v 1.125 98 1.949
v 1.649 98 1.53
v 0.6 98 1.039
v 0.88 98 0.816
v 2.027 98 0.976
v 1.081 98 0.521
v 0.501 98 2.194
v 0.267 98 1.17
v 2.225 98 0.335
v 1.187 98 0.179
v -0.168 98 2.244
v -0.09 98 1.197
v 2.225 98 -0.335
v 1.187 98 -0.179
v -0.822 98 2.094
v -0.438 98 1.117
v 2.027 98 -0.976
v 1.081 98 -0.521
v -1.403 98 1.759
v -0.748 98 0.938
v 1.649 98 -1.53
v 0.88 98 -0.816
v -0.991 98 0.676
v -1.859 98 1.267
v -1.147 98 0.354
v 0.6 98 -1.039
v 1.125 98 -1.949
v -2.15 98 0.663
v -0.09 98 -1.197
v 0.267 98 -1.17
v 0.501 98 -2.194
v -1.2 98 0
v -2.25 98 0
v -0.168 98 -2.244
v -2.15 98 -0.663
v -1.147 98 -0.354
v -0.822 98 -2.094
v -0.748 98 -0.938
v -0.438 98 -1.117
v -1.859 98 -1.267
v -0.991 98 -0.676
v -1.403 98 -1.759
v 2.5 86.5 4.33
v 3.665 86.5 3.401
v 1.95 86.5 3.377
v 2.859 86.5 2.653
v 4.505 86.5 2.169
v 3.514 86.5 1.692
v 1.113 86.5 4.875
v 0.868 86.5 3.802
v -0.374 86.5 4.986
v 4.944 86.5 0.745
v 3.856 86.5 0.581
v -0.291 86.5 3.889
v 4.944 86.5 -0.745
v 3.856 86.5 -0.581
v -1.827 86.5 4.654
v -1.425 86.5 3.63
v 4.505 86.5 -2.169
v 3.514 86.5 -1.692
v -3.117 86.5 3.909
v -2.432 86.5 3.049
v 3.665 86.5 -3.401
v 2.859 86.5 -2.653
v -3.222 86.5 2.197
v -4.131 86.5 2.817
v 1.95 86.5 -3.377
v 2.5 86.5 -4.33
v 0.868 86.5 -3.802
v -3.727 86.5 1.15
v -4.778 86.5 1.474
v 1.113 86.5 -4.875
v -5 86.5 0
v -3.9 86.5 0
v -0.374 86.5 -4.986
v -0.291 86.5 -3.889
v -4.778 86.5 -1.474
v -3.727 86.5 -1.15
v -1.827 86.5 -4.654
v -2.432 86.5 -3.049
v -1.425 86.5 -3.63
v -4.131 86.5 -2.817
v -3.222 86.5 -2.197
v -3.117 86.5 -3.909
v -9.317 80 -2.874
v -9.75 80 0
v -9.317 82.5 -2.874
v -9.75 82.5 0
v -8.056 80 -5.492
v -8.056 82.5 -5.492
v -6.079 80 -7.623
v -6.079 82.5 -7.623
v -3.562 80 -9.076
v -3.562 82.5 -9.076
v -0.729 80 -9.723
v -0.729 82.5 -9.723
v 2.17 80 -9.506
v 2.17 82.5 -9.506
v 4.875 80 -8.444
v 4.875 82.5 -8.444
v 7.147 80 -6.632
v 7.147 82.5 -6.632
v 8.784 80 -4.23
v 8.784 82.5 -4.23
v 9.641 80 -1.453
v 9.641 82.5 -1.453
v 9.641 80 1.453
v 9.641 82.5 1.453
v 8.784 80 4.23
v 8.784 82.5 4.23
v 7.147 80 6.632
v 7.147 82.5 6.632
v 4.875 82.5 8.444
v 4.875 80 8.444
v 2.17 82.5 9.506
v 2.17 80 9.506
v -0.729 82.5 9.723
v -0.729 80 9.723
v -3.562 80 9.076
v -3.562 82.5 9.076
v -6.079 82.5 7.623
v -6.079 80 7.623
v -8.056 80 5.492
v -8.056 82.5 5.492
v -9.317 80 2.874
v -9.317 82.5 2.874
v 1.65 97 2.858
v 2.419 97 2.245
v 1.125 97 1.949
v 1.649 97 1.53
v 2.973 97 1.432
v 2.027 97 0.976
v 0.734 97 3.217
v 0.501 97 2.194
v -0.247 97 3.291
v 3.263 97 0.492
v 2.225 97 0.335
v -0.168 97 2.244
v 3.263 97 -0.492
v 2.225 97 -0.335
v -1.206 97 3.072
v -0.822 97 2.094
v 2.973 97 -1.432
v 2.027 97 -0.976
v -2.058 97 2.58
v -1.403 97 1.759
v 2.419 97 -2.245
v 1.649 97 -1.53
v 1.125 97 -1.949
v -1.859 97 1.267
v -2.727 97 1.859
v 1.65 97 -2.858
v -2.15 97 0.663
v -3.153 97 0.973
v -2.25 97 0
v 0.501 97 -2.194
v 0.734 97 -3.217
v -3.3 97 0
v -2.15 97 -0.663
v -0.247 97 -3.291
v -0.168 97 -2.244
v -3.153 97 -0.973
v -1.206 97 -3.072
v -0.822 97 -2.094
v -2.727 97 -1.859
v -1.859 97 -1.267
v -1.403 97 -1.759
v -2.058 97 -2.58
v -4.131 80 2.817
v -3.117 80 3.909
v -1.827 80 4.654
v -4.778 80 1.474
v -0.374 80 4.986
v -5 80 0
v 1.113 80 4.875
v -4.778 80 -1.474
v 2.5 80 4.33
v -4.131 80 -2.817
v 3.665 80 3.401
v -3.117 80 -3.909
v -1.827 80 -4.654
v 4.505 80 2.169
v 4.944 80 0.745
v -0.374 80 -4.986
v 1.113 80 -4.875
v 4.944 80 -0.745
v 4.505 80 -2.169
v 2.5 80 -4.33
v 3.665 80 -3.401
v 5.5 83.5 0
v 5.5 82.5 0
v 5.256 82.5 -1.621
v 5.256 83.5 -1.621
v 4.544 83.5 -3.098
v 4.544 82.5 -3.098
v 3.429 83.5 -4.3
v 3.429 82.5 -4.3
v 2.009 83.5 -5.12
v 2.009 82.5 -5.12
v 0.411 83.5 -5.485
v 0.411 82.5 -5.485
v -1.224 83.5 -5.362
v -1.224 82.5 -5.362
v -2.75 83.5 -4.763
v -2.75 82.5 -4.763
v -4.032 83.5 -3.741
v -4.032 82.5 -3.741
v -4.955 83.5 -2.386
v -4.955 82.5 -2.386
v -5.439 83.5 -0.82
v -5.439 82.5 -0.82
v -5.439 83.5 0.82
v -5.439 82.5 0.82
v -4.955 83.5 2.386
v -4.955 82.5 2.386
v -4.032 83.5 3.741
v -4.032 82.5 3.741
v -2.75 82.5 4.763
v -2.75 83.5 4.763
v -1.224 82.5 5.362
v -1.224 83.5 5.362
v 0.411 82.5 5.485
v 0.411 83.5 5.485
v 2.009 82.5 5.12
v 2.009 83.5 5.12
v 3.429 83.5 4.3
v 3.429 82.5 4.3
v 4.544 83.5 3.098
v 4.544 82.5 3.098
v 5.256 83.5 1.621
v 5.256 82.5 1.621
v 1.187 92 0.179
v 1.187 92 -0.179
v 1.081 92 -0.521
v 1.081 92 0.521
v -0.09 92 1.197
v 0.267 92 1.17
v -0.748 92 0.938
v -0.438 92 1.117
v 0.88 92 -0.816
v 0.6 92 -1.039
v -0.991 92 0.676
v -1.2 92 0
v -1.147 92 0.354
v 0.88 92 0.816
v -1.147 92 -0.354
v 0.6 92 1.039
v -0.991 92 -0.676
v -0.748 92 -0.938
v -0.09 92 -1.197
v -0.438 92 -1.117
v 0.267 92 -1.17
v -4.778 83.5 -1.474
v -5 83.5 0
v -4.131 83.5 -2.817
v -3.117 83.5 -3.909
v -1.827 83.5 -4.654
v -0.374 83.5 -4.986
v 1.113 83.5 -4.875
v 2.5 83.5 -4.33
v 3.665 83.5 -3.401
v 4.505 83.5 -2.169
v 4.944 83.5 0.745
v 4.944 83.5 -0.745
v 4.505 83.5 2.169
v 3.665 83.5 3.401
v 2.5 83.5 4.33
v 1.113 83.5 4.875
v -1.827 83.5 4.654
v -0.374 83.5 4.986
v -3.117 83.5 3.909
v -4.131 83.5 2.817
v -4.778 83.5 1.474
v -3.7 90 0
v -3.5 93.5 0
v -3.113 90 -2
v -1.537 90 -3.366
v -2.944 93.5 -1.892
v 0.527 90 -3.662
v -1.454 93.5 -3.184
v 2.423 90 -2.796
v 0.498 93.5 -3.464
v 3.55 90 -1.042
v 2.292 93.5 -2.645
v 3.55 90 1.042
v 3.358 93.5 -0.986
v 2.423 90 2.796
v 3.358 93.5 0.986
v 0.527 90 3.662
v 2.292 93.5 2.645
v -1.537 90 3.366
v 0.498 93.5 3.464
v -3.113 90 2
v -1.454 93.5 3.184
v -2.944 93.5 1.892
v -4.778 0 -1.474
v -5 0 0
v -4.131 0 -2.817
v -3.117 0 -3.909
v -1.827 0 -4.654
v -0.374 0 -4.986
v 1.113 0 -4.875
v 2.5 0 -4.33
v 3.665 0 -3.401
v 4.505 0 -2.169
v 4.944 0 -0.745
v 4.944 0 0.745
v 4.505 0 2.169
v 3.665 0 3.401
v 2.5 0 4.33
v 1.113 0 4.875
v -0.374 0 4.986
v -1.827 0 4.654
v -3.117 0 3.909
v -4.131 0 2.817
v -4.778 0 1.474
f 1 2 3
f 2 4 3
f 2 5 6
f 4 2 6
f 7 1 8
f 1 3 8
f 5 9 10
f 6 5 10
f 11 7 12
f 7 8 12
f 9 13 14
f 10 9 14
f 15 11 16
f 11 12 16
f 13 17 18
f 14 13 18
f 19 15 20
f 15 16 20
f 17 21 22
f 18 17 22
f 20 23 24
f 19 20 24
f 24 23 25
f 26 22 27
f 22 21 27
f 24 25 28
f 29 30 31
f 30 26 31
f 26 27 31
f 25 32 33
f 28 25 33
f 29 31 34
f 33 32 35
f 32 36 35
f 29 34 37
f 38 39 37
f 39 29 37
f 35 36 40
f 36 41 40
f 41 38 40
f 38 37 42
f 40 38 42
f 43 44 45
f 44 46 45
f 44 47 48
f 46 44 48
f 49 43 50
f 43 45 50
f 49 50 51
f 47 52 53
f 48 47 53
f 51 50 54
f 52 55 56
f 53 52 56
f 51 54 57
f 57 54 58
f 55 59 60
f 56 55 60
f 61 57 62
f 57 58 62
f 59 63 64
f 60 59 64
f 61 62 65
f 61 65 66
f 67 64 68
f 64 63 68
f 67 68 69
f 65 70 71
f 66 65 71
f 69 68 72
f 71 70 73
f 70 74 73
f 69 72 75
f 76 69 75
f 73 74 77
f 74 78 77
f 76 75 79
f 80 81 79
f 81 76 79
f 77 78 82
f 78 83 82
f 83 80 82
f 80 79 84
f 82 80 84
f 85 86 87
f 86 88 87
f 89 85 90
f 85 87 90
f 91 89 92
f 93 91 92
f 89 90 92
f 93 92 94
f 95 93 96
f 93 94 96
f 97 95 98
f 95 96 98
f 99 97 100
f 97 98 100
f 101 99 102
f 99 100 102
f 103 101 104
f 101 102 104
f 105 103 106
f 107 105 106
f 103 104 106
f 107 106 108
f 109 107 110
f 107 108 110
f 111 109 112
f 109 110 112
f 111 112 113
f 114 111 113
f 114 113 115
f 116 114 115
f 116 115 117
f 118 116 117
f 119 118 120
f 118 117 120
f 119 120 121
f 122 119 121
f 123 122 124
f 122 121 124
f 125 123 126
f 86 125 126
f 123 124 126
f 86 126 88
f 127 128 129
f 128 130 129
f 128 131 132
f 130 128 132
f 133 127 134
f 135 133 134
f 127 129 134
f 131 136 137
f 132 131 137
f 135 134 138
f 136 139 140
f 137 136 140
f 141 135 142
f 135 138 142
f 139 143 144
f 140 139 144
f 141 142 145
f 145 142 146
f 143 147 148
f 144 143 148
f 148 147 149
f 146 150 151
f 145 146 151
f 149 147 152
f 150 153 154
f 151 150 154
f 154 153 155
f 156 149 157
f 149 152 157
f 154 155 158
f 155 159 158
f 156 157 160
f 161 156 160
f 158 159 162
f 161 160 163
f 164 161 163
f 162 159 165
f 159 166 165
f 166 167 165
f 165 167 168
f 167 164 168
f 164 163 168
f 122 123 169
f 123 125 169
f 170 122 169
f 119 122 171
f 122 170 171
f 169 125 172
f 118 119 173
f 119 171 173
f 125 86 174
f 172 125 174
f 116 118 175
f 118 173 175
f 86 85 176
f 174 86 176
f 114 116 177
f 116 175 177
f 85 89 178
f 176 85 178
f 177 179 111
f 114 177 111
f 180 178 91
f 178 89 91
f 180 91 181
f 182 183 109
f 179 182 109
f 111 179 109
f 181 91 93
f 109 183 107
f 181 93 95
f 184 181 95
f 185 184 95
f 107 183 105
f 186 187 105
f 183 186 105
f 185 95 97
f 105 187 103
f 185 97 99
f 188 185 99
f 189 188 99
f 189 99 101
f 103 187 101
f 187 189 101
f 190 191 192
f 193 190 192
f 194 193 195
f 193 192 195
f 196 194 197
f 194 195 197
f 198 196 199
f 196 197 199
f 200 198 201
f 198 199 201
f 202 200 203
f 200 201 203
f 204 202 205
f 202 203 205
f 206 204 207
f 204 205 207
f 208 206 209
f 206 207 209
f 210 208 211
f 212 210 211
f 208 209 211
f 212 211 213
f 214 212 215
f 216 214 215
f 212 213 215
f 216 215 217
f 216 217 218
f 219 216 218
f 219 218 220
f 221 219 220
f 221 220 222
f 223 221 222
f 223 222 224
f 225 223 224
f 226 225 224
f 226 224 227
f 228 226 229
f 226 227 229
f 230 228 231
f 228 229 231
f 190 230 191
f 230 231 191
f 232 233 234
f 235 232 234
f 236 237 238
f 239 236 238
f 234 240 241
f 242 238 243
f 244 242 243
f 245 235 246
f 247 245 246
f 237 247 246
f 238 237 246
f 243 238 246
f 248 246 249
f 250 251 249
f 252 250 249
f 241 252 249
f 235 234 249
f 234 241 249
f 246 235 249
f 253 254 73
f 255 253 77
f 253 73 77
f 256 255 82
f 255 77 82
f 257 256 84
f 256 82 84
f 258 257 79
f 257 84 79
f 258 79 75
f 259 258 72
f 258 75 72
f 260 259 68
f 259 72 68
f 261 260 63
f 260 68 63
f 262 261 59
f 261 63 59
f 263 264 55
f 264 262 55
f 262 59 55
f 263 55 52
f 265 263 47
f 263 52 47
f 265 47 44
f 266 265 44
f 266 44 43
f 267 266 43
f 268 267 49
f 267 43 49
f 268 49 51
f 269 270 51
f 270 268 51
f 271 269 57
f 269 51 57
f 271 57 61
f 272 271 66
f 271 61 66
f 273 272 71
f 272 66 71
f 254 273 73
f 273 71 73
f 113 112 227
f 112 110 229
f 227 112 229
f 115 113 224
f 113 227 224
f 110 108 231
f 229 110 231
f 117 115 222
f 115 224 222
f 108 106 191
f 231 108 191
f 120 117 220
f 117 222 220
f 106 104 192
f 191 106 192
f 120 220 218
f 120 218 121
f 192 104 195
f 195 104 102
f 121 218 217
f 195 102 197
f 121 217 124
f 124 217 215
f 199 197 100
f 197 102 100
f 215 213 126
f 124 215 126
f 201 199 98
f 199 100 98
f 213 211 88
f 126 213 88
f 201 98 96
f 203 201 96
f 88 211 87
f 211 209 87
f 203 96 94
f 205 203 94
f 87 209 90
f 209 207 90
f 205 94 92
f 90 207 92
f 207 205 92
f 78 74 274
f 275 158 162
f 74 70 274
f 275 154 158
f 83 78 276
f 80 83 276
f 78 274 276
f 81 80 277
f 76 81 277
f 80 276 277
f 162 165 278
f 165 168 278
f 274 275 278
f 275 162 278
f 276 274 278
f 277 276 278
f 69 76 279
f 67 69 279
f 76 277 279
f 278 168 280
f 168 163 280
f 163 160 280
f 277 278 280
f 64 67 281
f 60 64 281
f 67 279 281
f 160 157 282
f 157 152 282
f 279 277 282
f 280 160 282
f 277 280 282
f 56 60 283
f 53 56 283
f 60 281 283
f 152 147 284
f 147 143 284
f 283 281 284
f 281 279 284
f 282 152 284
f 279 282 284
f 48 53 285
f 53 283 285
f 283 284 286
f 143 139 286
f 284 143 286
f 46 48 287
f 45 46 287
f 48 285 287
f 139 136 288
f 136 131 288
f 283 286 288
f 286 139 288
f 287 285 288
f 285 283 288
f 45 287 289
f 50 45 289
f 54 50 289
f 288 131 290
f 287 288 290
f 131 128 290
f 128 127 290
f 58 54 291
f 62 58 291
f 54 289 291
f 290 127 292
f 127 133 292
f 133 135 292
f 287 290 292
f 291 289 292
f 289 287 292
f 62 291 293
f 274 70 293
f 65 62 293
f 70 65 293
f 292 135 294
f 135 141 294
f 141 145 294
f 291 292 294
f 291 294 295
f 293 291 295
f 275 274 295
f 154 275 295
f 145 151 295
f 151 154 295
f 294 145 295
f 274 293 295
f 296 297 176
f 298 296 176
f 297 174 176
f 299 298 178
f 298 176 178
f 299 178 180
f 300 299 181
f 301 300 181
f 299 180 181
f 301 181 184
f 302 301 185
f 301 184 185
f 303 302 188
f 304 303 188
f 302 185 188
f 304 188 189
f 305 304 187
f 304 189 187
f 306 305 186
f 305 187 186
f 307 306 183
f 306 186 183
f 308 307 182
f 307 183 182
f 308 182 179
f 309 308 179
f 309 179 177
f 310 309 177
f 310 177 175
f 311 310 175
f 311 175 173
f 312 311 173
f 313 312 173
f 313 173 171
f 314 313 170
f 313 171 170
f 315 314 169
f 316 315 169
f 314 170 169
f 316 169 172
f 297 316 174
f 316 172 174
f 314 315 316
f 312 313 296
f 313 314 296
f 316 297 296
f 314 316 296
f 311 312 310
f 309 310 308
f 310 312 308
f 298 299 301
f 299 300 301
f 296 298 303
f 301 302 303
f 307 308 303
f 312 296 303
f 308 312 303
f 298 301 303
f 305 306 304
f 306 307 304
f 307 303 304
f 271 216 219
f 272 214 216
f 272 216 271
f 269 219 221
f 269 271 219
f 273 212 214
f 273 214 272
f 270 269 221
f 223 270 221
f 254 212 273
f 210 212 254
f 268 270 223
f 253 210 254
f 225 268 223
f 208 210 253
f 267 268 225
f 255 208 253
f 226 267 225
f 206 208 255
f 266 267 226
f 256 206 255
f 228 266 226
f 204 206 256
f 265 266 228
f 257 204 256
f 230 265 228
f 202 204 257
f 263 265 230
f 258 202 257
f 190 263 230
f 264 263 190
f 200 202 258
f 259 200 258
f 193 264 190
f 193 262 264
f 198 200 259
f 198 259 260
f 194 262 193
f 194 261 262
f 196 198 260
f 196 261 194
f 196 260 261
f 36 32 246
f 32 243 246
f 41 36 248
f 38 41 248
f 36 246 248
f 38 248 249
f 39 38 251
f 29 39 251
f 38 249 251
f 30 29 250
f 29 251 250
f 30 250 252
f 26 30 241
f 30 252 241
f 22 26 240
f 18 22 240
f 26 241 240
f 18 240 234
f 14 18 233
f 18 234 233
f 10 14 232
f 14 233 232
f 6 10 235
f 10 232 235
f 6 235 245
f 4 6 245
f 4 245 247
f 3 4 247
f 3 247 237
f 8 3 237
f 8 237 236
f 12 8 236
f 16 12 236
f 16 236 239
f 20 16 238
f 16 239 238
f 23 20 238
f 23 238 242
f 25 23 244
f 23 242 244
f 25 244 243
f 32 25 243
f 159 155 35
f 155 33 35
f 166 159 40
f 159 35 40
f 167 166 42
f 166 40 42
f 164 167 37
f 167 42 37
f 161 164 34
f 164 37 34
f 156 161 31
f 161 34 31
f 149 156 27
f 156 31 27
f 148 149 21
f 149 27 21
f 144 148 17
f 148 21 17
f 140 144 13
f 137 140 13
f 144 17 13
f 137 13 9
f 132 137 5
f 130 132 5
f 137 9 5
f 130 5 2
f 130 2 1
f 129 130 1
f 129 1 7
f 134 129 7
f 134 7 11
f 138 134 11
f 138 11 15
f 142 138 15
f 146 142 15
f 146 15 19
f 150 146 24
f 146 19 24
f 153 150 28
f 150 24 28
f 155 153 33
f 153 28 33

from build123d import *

# Parameters (mm, degrees)
SKETCH2_R           = 5.5
BOSS_EXTRUDE1_DEPTH = 1


with BuildPart() as part:
    # Sketch1 → Revolve1 (revolve)
    with BuildSketch(Plane.XY, mode=Mode.PRIVATE) as revolve1_sk:
        Polygon((0, 0), (5, 0), (5, 80), (9.75, 80), (9.75, 82.5), (5, 82.5), (5, 86.5), (3.9, 86.5), (3.3, 97), (2.25, 97), (2.25, 98), (1.2, 98), (1.2, 92), (0, 92), align=None)
    revolve(revolve1_sk.sketch.rotate(Axis((0, 92, 0), (0, -1, 0)), 180), axis=Axis((0, 92, 0), (0, -1, 0)))

    # Sketch2 → Boss-Extrude1 (add)
    with BuildSketch(Plane(origin=(0, 82.5, 0), x_dir=(1, 0, 0), z_dir=(0, 1, 0))):
        Circle(SKETCH2_R)
    extrude(amount=BOSS_EXTRUDE1_DEPTH)


solid = part.part
